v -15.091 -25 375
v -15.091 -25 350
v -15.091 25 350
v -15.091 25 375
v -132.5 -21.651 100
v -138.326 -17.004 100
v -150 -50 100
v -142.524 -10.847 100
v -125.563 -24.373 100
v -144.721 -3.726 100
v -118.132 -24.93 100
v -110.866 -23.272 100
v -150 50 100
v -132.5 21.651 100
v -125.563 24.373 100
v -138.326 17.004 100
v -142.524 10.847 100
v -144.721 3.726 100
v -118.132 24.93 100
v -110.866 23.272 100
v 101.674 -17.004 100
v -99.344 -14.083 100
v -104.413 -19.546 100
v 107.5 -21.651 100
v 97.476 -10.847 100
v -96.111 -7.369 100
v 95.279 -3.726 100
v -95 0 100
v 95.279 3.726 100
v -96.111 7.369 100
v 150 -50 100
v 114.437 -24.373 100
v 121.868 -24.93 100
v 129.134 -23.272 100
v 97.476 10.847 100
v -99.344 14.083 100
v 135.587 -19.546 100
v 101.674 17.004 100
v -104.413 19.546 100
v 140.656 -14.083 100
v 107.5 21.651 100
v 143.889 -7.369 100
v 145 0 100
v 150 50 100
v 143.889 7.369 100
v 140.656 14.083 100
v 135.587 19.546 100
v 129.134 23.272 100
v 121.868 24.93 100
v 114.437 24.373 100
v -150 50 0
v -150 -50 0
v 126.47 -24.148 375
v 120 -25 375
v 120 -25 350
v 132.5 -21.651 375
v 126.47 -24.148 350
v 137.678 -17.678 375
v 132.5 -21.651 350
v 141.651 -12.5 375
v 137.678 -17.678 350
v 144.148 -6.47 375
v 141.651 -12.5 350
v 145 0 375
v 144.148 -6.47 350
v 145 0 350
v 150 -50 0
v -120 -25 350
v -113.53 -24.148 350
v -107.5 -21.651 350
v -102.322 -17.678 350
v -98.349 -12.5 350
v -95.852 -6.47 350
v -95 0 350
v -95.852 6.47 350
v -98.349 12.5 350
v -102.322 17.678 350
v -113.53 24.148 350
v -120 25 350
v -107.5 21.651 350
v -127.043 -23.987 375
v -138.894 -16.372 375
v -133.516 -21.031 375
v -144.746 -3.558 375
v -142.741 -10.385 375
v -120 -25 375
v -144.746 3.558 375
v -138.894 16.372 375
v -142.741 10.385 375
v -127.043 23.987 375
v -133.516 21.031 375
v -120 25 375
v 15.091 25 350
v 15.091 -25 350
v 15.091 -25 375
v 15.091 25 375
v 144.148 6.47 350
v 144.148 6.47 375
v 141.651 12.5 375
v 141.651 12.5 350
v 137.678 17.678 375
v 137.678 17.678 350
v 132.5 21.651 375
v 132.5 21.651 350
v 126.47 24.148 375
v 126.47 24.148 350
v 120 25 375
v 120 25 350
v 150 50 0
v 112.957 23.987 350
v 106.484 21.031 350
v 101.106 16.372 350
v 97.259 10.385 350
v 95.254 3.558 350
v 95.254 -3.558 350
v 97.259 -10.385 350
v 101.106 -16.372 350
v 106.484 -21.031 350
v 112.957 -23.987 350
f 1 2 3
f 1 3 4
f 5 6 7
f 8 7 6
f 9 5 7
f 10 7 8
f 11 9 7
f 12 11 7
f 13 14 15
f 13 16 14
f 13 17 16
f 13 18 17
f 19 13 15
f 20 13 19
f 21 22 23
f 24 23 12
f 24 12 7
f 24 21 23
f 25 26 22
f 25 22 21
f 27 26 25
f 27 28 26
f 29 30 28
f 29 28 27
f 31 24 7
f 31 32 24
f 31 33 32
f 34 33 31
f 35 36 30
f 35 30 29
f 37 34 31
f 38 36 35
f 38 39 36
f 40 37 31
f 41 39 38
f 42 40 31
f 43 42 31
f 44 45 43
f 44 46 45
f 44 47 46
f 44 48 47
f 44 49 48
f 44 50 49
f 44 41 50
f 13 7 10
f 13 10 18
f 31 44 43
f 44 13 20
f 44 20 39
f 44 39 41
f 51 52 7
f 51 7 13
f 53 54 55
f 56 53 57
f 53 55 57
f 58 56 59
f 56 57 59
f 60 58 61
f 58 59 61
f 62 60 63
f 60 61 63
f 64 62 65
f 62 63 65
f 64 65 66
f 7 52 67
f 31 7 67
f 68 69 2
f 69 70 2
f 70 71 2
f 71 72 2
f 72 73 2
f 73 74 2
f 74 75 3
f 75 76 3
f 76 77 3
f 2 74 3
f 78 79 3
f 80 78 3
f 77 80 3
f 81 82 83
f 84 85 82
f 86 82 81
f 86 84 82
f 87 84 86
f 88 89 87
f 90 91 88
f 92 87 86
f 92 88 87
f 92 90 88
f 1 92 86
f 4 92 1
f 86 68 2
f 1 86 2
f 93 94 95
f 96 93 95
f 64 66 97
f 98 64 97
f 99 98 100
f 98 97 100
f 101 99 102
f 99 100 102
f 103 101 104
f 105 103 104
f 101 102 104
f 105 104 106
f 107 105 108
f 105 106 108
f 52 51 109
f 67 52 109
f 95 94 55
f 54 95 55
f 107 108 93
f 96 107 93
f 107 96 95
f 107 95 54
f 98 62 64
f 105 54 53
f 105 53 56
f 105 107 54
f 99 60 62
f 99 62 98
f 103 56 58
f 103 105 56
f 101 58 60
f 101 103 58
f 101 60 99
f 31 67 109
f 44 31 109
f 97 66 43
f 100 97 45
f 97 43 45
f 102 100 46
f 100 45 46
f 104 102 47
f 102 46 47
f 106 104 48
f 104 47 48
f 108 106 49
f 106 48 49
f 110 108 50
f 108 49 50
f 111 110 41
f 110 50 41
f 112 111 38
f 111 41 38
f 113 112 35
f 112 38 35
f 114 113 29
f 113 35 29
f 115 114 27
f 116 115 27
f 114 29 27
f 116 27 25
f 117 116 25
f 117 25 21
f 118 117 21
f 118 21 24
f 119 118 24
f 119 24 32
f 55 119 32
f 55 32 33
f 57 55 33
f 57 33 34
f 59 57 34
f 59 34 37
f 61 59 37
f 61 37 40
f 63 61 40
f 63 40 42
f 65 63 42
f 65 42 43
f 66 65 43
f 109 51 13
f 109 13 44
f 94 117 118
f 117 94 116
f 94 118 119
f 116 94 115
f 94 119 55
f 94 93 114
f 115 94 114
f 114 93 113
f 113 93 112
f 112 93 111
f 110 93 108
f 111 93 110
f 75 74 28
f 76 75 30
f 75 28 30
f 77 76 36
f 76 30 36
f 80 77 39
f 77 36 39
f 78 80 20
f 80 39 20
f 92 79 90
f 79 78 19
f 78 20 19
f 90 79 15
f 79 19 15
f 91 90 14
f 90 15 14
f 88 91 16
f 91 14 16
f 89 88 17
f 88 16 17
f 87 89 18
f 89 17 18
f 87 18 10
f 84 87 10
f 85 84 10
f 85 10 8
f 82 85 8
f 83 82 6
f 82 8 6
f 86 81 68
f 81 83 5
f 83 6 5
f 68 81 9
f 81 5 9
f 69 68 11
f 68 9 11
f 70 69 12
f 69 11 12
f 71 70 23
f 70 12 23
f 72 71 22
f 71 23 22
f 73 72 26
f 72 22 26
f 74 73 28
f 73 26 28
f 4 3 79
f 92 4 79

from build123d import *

# Parameters (mm, degrees)
F0_W     = 300
F0_H     = 100
F1_DEPTH = 100
F3_R     = 25
F4_DEPTH = 250
F6_DEPTH = 25
F7_DEPTH = 25
F8_W     = 30.181502
F8_H     = 25
F9_DEPTH = 75.001


with BuildPart() as f1:
    # F0 (on Top) → F1 (new body)
    with BuildSketch(Plane.XY):
        Rectangle(F0_W, F0_H)
    extrude(amount=F1_DEPTH)

    # F3 (on face) → F4 (join)
    with BuildSketch(Plane.XY.offset(100)):
        with Locations((120, 0)):
            Circle(F3_R)
        with Locations((-120, 0)):
            Circle(F3_R)
    extrude(amount=F4_DEPTH)

    # F5 (on face) → F6 (join)
    with BuildSketch(Plane.XY.offset(350)):
        with BuildLine():
            Line((120.000002, 25), (-120, 25))
            ThreePointArc((-120, 25), (-102.32233, 17.67767), (-95, 0))
            ThreePointArc((-95, 0), (-102.32233, -17.67767), (-120, -25))
            Line((-120, -25), (120.000002, -25))
            Line((120.000002, -25), (120.000002, 25))
        make_face()
        with BuildLine():
            ThreePointArc((-95, 0), (-102.32233, 17.67767), (-120, 25))
            Line((-120, 25), (-120, -25))
            ThreePointArc((-120, -25), (-102.32233, -17.67767), (-95, 0))
        make_face()
    extrude(amount=F6_DEPTH)

    # F4_face (on face) → F7 (join, through all)
    with BuildSketch(Plane(origin=(-120, 0, 350), x_dir=(1, 0, 0), z_dir=(0, 0, 1))):
        with BuildLine():
            Line((0, -25), (0, 25))
            ThreePointArc((0, 25), (-25, 0), (0, -25))
        make_face()
        with BuildLine():
            ThreePointArc((240.000002, -25), (257.67767, -17.677669), (265, 0))
            ThreePointArc((265, 0), (257.67767, 17.677669), (240.000002, 25))
            Line((240.000002, 25), (240.000002, -25))
        make_face()
    extrude(amount=F7_DEPTH)

    # F8 (on face) → F9 (cut, through all)
    with BuildSketch(Plane.XZ.offset(25)):
        with Locations((0, 362.5)):
            Rectangle(F8_W, F8_H)
    extrude(amount=-F9_DEPTH, mode=Mode.SUBTRACT)


solid = f1.part
